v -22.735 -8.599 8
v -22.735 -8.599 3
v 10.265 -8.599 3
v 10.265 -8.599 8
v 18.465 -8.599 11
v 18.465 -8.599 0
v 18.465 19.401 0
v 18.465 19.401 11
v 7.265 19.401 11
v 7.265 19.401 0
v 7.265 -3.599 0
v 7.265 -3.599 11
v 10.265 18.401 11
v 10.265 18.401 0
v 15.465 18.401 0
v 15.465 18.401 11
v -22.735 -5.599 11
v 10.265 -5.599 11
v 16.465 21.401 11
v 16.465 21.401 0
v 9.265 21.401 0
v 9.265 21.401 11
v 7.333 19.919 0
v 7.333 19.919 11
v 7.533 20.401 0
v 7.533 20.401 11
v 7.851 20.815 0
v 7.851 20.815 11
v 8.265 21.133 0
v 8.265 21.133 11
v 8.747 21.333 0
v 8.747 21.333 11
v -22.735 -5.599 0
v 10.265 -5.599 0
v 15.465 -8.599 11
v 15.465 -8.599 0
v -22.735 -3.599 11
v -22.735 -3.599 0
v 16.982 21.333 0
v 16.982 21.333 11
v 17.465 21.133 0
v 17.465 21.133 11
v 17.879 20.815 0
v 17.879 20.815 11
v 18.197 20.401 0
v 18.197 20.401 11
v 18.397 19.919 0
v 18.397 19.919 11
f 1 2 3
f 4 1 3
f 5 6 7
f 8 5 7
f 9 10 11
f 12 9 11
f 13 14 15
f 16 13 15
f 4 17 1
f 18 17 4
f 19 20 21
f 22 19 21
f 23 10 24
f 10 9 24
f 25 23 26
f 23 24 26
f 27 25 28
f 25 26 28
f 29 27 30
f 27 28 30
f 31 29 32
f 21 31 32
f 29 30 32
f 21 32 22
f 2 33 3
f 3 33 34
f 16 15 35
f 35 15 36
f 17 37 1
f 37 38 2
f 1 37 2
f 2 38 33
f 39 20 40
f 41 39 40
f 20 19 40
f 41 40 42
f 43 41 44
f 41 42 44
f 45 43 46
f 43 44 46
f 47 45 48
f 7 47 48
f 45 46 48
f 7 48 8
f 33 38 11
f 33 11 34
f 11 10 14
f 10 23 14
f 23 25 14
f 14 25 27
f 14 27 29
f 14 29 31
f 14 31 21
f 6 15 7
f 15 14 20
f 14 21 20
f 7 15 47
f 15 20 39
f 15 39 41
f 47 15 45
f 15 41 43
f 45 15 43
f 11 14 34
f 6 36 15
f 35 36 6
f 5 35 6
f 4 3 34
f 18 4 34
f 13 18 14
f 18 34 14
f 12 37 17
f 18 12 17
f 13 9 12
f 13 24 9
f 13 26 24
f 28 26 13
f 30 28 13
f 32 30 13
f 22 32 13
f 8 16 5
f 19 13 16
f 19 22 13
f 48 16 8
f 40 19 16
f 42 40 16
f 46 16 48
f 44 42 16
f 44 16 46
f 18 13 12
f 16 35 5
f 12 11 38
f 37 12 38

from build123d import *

# Parameters (mm, degrees)
PAD_DEPTH    = 11
CHAMFER_SIZE = 3
FILLET_R     = 2


with BuildPart() as part:
    # Sketch → Pad (new body)
    with BuildSketch(Plane.XY):
        Polygon((-22.735205, -3.599016), (-22.735205, -8.599016), (10.264795, -8.599016), (10.264795, 18.400984), (15.464795, 18.400984), (15.464795, -8.599016), (18.464795, -8.599016), (18.464795, 21.400984), (7.264795, 21.400984), (7.264795, -3.599016), align=None)
    extrude(amount=PAD_DEPTH)

    # Chamfer
    chamfer_edges = [part.edges().sort_by_distance(p)[0] for p in [
        (-6.235205, -8.599016, 0),
        (-6.235205, -8.599016, 11),
    ]]
    chamfer(chamfer_edges, length=CHAMFER_SIZE)

    # Fillet
    fillet_edges = [part.edges().sort_by_distance(p)[0] for p in [
        (18.464795, 21.400984, 5.5),
        (7.264795, 21.400984, 5.5),
    ]]
    fillet(fillet_edges, radius=FILLET_R)


solid = part.part
